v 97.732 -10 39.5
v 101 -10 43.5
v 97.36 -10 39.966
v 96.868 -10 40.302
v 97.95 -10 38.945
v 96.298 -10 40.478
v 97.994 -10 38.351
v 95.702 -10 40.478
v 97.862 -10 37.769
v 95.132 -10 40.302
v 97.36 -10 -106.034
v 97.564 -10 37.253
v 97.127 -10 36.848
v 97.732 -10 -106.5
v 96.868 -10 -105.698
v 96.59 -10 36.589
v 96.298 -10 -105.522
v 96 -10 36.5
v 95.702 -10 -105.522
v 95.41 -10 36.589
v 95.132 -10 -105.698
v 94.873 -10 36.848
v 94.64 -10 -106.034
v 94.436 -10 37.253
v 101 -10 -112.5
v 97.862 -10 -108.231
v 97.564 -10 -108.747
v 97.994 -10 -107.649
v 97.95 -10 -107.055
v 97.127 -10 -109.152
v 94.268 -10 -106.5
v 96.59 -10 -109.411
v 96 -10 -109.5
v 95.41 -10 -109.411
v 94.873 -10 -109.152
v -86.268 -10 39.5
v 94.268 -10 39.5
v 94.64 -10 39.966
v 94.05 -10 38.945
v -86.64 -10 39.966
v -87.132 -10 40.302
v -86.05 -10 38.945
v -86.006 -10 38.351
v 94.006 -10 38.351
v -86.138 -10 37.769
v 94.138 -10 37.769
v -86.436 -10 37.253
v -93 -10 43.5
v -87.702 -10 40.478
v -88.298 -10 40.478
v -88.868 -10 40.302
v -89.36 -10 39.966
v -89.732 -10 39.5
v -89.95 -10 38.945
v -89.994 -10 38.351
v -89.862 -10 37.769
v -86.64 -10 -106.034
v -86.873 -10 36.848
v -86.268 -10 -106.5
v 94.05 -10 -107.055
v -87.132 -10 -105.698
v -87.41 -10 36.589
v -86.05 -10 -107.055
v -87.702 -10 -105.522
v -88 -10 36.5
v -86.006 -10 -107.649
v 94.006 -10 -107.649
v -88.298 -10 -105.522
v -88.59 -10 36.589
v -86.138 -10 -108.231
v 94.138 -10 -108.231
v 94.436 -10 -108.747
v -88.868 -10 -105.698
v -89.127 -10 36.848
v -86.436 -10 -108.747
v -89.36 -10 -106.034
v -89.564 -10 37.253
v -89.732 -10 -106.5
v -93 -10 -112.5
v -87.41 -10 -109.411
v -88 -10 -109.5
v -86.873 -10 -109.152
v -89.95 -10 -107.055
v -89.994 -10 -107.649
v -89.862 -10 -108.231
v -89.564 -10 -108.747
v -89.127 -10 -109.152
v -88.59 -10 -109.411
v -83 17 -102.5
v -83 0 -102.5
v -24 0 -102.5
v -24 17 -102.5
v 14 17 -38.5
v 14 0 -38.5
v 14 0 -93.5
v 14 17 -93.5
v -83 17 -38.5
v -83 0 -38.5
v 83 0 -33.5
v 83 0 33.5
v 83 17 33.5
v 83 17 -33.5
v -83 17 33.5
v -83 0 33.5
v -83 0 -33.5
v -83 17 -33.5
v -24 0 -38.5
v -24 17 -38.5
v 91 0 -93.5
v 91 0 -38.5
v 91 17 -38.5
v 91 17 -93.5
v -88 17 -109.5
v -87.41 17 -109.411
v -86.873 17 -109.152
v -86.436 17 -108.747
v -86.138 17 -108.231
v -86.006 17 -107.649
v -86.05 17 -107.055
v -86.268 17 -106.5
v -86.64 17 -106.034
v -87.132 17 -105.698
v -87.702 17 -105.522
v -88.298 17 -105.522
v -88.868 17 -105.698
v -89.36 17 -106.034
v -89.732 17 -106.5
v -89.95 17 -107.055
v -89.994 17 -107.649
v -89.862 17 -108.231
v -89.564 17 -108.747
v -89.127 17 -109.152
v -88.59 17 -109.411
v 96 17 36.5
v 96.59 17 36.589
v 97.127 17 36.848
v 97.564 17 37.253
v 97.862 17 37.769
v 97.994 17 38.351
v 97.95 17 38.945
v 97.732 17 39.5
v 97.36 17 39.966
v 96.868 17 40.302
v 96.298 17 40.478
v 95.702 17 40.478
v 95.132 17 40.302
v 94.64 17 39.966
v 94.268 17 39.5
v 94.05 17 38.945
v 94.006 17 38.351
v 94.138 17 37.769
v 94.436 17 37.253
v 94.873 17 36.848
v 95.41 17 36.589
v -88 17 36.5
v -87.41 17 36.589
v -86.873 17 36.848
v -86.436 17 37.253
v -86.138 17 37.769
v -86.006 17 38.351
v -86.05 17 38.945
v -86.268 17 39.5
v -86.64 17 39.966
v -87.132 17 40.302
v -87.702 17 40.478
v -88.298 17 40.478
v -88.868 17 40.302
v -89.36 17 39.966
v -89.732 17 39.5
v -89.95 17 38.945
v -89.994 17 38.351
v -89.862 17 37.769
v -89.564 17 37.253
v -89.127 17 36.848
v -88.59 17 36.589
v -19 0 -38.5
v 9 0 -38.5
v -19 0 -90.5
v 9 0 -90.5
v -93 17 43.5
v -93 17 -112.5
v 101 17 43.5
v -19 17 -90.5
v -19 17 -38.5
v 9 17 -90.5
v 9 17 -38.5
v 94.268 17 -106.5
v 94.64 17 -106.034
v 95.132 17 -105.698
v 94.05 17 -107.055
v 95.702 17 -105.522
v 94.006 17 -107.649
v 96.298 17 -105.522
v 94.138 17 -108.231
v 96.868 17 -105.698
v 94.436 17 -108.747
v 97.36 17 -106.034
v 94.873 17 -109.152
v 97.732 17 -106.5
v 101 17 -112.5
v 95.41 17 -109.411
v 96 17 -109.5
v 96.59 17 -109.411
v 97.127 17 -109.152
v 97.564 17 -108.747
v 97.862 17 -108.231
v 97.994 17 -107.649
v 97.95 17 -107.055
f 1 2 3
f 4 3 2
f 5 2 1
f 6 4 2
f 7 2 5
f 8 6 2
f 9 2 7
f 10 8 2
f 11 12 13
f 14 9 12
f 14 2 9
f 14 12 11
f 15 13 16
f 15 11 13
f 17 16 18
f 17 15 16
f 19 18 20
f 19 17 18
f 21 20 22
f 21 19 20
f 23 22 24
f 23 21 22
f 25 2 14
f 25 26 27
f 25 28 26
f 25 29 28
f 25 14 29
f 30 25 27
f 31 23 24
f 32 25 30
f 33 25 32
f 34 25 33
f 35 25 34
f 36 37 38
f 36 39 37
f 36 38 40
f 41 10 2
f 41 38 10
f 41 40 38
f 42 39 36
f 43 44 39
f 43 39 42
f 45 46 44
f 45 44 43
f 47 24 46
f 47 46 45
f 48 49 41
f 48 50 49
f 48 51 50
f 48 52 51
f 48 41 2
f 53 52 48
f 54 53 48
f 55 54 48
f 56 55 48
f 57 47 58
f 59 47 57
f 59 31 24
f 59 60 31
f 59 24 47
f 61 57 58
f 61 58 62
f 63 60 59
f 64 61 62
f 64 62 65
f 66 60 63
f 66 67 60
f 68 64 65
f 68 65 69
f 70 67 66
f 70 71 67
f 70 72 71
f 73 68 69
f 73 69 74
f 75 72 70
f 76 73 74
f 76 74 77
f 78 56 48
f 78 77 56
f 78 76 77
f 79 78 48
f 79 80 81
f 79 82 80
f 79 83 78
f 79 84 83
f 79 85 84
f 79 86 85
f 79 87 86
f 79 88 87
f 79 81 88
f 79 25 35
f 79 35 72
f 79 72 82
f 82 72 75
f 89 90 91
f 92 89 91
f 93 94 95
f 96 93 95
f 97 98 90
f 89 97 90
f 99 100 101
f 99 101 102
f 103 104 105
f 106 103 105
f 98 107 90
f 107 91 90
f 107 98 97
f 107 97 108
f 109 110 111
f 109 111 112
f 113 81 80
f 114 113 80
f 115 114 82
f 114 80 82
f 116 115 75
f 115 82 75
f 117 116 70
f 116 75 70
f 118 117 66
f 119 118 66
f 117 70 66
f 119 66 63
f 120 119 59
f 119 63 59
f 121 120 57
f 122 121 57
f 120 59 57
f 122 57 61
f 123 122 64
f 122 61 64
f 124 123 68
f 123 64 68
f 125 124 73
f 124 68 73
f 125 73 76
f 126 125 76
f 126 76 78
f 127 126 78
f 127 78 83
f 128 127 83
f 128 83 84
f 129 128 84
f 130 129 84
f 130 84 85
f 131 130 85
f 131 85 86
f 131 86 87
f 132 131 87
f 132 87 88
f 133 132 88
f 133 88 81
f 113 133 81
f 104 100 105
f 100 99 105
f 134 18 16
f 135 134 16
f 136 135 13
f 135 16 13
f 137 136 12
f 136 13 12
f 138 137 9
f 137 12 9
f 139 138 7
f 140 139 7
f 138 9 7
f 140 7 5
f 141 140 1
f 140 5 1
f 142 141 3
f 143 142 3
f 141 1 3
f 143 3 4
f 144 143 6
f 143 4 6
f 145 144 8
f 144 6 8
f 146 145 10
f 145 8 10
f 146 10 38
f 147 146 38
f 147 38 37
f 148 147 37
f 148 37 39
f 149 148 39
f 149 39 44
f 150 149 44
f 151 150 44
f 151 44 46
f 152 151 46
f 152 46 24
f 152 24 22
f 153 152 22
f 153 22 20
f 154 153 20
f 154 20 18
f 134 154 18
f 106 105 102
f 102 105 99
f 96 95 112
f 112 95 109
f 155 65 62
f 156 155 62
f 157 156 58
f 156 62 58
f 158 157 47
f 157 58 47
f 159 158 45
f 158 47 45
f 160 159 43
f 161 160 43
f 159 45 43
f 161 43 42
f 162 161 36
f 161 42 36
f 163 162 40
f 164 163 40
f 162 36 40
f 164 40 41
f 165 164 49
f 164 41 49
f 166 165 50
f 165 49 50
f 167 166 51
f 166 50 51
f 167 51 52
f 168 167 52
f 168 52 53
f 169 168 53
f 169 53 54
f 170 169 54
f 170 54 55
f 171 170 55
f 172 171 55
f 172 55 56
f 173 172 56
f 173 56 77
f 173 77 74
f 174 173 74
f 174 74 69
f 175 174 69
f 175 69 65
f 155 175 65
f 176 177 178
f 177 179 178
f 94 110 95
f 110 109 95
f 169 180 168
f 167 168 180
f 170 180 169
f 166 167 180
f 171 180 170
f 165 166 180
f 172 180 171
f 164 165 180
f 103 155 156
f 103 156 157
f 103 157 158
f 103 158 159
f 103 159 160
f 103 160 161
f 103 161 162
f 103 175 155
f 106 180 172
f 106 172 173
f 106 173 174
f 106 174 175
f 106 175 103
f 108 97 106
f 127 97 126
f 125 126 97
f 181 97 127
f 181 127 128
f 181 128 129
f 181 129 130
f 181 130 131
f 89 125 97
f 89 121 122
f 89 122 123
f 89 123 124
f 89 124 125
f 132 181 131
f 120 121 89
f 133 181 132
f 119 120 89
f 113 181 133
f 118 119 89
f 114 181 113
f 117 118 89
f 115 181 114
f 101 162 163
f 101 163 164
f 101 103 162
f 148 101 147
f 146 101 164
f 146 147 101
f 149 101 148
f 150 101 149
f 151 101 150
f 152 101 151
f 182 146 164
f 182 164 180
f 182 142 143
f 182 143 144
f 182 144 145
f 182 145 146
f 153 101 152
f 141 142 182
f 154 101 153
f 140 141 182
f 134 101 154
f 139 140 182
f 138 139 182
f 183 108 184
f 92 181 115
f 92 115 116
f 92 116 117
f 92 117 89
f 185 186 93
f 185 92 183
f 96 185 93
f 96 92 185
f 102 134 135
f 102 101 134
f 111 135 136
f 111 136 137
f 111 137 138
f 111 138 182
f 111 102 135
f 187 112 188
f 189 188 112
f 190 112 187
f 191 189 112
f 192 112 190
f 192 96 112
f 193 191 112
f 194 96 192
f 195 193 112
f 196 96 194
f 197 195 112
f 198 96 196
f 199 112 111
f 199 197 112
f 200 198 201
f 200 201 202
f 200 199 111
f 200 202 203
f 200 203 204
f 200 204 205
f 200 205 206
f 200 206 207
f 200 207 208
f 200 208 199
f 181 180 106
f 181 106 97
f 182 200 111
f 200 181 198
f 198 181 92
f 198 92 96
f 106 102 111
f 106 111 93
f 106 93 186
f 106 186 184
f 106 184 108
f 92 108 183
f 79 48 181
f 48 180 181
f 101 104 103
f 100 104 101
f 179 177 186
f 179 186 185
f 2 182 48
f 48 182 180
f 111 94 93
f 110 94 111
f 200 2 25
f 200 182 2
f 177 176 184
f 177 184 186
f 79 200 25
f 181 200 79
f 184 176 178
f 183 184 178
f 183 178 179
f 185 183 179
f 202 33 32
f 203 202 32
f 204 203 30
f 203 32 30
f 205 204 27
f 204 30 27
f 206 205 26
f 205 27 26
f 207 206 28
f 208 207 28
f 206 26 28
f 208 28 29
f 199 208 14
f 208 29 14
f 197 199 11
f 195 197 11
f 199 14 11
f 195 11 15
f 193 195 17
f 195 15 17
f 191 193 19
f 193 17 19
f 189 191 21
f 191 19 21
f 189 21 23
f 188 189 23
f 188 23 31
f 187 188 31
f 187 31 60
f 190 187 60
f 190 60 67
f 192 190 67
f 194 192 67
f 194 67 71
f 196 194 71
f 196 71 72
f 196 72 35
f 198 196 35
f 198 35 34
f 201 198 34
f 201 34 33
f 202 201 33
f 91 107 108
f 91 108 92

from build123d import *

# Parameters (mm, degrees)
SKETCH1_W           = 194
SKETCH1_H           = 156
SKETCH1_W_2         = 166
SKETCH1_H_2         = 67
SKETCH1_W_3         = 59
SKETCH1_H_3         = 64
SKETCH1_W_4         = 28
SKETCH1_H_4         = 52
SKETCH1_W_5         = 77
SKETCH1_H_5         = 55
BOSS_EXTRUDE1_DEPTH = 17
SKETCH2_W           = 194
SKETCH2_H           = 156
BOSS_EXTRUDE2_DEPTH = 10
SKETCH3_R           = 2
CUT_EXTRUDE1_DEPTH  = 30


with BuildPart() as part:
    # Sketch1 → Boss-Extrude1 (new body)
    with BuildSketch(Plane(origin=(0, 0, 0), x_dir=(1, 0, 0), z_dir=(0, 1, 0))):
        with Locations((4, 34.5)):
            Rectangle(SKETCH1_W, SKETCH1_H)
        Rectangle(SKETCH1_W_2, SKETCH1_H_2, mode=Mode.SUBTRACT)
        with Locations((-53.5, 70.5)):
            Rectangle(SKETCH1_W_3, SKETCH1_H_3, mode=Mode.SUBTRACT)
        with Locations((-5, 64.5)):
            Rectangle(SKETCH1_W_4, SKETCH1_H_4, mode=Mode.SUBTRACT)
        with Locations((52.5, 66)):
            Rectangle(SKETCH1_W_5, SKETCH1_H_5, mode=Mode.SUBTRACT)
    extrude(amount=BOSS_EXTRUDE1_DEPTH)

    # Sketch2 → Boss-Extrude2 (add)
    with BuildSketch(Plane(origin=(0, 0, 0), x_dir=(-1, 0, 0), z_dir=(0, -1, 0))):
        with Locations((-4, 34.5)):
            Rectangle(SKETCH2_W, SKETCH2_H)
    extrude(amount=BOSS_EXTRUDE2_DEPTH)

    # Sketch3 → Cut-Extrude1 (cut)
    with BuildSketch(Plane(origin=(0, -10, 0), x_dir=(-1, 0, 0), z_dir=(0, -1, 0))):
        with Locations(Location((88, -38.5, 0), (0, 0, 90))):
            Circle(SKETCH3_R)
        with Locations(Location((88, 107.5, 0), (0, 0, 90))):
            Circle(SKETCH3_R)
        with Locations(Location((-96, -38.5, 0), (0, 0, 90))):
            Circle(SKETCH3_R)
        with Locations(Location((-96, 107.5, 0), (0, 0, 90))):
            Circle(SKETCH3_R)
    extrude(amount=-CUT_EXTRUDE1_DEPTH, mode=Mode.SUBTRACT)


solid = part.part
